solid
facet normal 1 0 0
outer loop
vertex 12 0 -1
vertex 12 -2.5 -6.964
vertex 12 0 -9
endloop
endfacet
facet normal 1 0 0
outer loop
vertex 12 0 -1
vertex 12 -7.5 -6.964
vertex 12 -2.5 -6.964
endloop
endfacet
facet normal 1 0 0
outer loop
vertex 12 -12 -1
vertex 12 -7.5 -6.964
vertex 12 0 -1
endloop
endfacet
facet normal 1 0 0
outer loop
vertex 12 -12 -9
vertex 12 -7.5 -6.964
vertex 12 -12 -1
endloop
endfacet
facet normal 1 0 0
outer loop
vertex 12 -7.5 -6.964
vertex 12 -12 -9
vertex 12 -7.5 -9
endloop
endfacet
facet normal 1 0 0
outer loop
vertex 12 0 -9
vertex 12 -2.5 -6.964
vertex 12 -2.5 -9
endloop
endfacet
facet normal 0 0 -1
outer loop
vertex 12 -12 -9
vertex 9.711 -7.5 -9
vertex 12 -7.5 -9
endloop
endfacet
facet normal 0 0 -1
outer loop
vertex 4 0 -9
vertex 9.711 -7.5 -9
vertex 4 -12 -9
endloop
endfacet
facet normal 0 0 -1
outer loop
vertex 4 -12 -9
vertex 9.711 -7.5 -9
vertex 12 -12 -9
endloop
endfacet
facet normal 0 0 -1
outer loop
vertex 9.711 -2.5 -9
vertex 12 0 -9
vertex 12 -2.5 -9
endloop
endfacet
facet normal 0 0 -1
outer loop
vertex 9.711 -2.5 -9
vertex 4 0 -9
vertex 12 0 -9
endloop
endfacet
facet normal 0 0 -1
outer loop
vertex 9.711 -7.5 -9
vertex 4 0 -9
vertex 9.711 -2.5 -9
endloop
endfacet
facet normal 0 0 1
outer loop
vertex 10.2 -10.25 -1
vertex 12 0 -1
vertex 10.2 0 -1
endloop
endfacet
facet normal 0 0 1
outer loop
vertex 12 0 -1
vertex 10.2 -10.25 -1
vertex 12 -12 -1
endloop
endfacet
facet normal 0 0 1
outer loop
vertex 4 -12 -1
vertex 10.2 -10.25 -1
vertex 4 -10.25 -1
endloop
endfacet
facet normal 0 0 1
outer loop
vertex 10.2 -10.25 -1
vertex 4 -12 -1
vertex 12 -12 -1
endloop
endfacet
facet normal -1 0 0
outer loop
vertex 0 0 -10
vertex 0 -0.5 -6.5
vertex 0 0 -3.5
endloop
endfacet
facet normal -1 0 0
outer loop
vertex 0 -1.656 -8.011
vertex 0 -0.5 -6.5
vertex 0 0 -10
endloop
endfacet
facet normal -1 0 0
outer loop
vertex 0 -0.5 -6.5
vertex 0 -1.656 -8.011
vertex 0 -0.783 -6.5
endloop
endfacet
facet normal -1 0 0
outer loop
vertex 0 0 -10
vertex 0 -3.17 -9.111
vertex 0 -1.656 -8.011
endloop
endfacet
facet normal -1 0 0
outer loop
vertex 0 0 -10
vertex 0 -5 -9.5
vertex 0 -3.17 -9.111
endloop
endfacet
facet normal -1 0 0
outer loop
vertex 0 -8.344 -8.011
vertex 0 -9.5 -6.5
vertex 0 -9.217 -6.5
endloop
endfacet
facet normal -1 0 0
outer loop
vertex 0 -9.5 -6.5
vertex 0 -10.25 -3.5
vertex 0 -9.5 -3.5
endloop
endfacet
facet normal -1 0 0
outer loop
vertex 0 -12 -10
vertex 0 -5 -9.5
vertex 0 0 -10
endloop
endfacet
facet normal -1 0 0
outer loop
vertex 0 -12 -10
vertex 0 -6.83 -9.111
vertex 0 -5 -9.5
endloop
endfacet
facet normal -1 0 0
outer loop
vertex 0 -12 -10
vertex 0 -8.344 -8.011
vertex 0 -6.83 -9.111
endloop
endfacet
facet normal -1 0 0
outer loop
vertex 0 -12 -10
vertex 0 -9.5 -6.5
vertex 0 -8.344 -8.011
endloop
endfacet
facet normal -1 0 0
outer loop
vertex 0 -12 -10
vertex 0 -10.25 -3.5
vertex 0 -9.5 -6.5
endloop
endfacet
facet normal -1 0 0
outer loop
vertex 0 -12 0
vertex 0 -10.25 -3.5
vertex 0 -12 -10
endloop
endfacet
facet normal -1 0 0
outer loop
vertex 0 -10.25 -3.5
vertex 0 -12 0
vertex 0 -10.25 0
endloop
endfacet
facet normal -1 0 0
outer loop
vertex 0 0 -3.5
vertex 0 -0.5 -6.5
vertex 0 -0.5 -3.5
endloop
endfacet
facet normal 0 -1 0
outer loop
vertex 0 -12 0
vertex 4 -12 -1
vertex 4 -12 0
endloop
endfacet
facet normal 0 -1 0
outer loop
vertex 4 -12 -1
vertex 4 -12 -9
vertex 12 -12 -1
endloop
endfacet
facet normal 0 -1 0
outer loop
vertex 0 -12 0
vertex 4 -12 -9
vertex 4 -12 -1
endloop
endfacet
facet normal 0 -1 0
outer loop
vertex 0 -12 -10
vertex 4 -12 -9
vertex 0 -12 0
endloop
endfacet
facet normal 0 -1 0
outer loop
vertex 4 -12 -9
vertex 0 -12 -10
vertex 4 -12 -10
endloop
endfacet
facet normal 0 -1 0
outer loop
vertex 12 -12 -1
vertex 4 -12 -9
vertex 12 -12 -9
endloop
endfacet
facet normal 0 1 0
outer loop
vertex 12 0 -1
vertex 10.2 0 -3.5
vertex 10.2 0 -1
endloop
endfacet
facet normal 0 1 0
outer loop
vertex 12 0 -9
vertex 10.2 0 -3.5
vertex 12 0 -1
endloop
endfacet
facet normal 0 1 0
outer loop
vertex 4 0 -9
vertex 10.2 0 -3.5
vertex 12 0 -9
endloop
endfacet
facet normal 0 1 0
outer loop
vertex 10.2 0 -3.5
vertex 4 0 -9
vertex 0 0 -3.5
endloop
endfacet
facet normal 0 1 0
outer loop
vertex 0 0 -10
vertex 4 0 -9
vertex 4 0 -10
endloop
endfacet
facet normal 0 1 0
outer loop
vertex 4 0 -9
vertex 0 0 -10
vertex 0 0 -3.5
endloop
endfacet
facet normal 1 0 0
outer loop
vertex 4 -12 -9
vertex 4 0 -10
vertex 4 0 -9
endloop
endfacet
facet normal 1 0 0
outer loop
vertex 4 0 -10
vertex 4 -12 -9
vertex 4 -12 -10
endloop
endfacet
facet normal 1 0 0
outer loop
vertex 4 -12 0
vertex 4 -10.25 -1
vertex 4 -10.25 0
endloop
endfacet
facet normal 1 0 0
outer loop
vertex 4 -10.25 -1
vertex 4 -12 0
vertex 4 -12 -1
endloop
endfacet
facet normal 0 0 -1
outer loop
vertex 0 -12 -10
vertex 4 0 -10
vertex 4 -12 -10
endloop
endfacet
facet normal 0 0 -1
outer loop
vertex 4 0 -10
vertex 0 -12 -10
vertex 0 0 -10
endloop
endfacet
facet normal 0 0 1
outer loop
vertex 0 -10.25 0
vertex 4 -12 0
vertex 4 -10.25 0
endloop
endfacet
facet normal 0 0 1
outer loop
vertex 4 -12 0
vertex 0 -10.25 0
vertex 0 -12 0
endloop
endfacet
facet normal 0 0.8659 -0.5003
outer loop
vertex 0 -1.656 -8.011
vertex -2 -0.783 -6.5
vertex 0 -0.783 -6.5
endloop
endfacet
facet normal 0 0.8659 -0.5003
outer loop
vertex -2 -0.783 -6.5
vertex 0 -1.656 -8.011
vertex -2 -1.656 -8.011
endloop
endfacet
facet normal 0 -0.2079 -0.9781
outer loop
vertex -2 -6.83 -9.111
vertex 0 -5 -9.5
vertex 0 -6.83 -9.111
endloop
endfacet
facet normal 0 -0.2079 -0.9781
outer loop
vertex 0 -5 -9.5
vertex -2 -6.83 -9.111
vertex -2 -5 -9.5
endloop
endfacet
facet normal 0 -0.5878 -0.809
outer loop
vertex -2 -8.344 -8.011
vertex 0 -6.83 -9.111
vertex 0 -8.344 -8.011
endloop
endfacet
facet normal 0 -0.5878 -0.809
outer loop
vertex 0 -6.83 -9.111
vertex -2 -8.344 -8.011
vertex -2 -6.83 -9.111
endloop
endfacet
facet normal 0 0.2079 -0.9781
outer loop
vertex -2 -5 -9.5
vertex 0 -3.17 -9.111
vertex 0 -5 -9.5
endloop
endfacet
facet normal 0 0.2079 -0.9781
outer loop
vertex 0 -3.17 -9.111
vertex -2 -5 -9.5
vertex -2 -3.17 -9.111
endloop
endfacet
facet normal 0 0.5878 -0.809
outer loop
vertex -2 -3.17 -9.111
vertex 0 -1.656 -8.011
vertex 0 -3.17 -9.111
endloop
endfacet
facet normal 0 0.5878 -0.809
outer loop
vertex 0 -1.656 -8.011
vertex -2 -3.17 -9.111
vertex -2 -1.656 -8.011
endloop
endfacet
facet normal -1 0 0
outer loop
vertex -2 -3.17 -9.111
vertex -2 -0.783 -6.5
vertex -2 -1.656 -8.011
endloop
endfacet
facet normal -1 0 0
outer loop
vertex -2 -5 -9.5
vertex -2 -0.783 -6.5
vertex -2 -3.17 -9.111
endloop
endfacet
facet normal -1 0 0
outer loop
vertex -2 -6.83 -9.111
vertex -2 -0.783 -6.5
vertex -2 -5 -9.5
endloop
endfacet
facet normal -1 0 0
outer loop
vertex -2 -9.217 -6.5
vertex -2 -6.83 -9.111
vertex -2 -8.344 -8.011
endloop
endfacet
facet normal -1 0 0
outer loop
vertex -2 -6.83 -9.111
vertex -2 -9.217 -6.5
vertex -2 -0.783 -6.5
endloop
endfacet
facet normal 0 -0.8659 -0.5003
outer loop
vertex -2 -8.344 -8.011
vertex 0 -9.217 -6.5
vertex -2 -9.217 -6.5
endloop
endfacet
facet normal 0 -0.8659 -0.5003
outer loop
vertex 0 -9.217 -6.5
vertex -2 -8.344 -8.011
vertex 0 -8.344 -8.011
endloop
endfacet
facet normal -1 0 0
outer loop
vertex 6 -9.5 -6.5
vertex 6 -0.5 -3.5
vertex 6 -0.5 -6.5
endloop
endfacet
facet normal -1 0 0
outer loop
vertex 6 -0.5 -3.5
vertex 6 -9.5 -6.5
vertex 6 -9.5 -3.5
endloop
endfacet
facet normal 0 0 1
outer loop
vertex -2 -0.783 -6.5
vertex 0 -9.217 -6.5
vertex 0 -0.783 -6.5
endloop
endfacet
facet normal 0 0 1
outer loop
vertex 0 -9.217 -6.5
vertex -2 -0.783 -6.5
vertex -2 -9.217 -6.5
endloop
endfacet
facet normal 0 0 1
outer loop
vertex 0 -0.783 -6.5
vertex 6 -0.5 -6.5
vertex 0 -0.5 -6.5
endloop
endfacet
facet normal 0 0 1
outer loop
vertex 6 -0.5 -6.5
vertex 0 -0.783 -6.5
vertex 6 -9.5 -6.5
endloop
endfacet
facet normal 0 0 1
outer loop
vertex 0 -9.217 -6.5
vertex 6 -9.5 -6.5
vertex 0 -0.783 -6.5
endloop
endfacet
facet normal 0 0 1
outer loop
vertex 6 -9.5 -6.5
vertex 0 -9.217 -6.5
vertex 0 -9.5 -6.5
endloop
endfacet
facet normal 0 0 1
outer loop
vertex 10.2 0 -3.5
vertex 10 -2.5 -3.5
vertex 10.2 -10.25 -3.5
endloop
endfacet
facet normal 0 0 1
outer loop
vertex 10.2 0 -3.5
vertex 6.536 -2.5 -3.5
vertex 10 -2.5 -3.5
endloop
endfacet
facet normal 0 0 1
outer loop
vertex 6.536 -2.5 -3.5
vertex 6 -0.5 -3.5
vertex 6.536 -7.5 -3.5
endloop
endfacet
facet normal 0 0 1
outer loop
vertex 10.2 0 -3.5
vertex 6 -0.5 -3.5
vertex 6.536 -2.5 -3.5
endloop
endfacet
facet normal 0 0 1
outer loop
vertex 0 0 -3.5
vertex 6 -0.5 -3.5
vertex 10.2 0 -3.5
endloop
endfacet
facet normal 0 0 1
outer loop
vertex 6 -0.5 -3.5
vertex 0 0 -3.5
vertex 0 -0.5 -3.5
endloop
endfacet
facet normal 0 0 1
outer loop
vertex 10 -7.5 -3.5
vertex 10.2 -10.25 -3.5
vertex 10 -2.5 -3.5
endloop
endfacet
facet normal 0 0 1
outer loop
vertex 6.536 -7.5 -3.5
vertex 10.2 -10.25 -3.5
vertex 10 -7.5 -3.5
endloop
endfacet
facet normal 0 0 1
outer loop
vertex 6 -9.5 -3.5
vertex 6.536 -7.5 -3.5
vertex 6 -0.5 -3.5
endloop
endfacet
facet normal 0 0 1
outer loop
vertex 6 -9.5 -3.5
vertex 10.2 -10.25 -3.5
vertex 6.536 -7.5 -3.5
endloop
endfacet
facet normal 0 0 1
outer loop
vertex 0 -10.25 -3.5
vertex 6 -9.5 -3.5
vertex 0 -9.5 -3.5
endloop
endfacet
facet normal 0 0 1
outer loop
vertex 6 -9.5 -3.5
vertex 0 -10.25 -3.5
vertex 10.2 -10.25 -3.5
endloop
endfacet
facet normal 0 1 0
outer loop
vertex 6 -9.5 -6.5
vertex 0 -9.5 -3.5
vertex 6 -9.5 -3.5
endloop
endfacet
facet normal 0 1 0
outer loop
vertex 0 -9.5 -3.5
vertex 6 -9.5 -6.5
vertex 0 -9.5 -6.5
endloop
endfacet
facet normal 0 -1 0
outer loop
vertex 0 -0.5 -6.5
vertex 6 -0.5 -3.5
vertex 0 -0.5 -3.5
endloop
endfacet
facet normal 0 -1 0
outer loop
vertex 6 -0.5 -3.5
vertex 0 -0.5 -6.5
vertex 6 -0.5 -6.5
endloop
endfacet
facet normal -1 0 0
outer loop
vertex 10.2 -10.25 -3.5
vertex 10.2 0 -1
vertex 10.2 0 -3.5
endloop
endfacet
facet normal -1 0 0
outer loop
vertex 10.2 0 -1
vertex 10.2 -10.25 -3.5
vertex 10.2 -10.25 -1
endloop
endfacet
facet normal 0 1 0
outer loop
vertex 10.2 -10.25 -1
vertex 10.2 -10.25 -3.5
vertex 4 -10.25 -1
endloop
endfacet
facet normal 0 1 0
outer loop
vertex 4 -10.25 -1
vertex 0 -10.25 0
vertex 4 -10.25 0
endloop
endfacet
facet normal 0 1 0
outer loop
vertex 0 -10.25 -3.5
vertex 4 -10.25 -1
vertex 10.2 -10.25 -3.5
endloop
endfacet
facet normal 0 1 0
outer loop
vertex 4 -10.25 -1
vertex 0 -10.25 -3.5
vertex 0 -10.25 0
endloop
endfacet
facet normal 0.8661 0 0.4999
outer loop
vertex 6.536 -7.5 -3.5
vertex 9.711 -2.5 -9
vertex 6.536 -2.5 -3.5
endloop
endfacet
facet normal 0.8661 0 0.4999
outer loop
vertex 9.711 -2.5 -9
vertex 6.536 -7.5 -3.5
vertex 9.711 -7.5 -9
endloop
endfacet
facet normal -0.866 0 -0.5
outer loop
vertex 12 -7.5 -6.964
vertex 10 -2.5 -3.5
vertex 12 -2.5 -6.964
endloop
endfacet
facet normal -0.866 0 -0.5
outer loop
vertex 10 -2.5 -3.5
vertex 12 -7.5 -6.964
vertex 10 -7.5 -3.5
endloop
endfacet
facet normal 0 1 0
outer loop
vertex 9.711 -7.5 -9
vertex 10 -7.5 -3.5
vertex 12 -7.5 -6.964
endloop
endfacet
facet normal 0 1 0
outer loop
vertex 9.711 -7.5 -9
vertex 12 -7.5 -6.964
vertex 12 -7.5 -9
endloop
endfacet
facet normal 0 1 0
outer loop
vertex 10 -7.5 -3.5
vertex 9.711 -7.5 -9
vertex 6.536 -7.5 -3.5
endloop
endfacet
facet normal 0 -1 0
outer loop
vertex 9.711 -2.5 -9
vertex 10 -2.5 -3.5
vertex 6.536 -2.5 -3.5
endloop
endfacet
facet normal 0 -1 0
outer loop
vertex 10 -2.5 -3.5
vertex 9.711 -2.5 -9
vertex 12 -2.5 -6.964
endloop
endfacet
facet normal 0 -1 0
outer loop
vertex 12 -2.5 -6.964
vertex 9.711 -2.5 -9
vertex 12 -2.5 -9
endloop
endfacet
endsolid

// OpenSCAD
rotate([180,0,0])difference(){
	union(){
		translate([0,0,1])cube([12,12,8]);
		cube([4,12,10]);
		rotate([0,-90,0])translate([5,5,0])cylinder(d=9,h=2);
	}
	translate([-1,0,6.5]){
		translate([-1,.5,-3])cube([8,9,3]);
		translate([-1,-.25,-8])cube([12.2,10.5,5]);
		translate([11,2.5,-3])rotate([0,-60,0])translate([-3,0,0])cube([10,5,3]);
	}
}
